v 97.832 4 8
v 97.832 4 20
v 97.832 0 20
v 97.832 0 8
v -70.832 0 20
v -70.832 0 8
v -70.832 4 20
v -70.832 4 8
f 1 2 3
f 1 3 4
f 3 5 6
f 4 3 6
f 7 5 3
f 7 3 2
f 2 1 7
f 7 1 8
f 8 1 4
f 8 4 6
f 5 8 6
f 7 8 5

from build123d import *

# Parameters (mm, degrees)
SKETCH1_W              = 155.663706144
SKETCH1_H              = 4
BOSS_EXTRUDE1_DEPTH    = 10
BOSS_EXTRUDE4_DEPTH    = 10
FILLET1_R              = 0.5
LPATTERN1_COUNT        = 21
LPATTERN1_PITCH        = 6.283185307
FILLET1_OF_LPATTERN1_R = 0.5
BOSS_EXTRUDE6_DEPTH    = 6
SKETCH11_W             = 16
SKETCH11_H             = 4
BOSS_EXTRUDE8_DEPTH    = 10
SKETCH12_W             = 16
SKETCH12_H             = 4
BOSS_EXTRUDE9_DEPTH    = 10
SKETCH15_W             = 175.663706144
SKETCH15_H             = 16
BOSS_EXTRUDE10_DEPTH   = 5
BOSS_EXTRUDE11_DEPTH   = 4
SKETCH17_W             = 20
SKETCH17_H             = 9
BOSS_EXTRUDE12_DEPTH   = 10
SKETCH18_W             = 20
SKETCH18_H             = 9
CUT_EXTRUDE2_DEPTH     = 17
SKETCH19_W             = 170
SKETCH19_H             = 15
CUT_EXTRUDE3_DEPTH     = 8
SKETCH21_W             = 168.663706144
SKETCH21_H             = 4.5
CUT_EXTRUDE5_DEPTH     = 13
SKETCH20_W             = 12
SKETCH20_H             = 5
CUT_EXTRUDE4_DEPTH     = 169.663706144


with BuildPart() as part:
    # Sketch1 → Boss-Extrude1 (new body)
    with BuildSketch(Plane.XY):
        with Locations((0, 2)):
            Rectangle(SKETCH1_W, SKETCH1_H)
    extrude(amount=BOSS_EXTRUDE1_DEPTH)

    # Sketch2 → Boss-Extrude4 (add)
    with BuildSketch(Plane.XY):
        Polygon((-65.312574984, 4), (-63.67470893, 8.5), (-61.988997214, 8.5), (-60.351131159, 4), align=None)
    boss_extrude4 = extrude(amount=BOSS_EXTRUDE4_DEPTH)

    # Fillet1
    fillet1_edges = [part.edges().sort_by_distance(p)[0] for p in [
        (-60.351131159, 4, 5),
        (-65.312574984, 4, 5),
    ]]
    fillet(fillet1_edges, radius=FILLET1_R)

    # LPattern1: Boss-Extrude4 ×21
    with Locations(*[(i * LPATTERN1_PITCH, 0, 0) for i in range(1, LPATTERN1_COUNT)]):
        add(boss_extrude4)

    # Fillet1 of LPattern1
    fillet1_of_lpattern1_edges = [part.edges().sort_by_distance(p)[0] for p in [
        (-54.067945852, 4, 5),
        (-59.029389677, 4, 5),
        (-47.784760545, 4, 5),
        (-52.74620437, 4, 5),
        (-41.501575238, 4, 5),
        (-46.463019063, 4, 5),
        (-35.218389931, 4, 5),
        (-40.179833756, 4, 5),
        (-28.935204623, 4, 5),
        (-33.896648448, 4, 5),
        (-22.652019316, 4, 5),
        (-27.613463141, 4, 5),
        (-16.368834009, 4, 5),
        (-21.330277834, 4, 5),
        (-10.085648702, 4, 5),
        (-15.047092527, 4, 5),
        (-3.802463395, 4, 5),
        (-8.76390722, 4, 5),
        (2.480721912, 4, 5),
        (-2.480721912, 4, 5),
        (8.76390722, 4, 5),
        (3.802463395, 4, 5),
        (15.047092527, 4, 5),
        (10.085648702, 4, 5),
        (21.330277834, 4, 5),
        (16.368834009, 4, 5),
        (27.613463141, 4, 5),
        (22.652019316, 4, 5),
        (33.896648448, 4, 5),
        (28.935204623, 4, 5),
        (40.179833756, 4, 5),
        (35.218389931, 4, 5),
        (46.463019063, 4, 5),
        (41.501575238, 4, 5),
        (52.74620437, 4, 5),
        (47.784760545, 4, 5),
        (59.029389677, 4, 5),
        (54.067945852, 4, 5),
        (65.312574984, 4, 5),
        (60.351131159, 4, 5),
    ]]
    fillet(fillet1_of_lpattern1_edges, radius=FILLET1_OF_LPATTERN1_R)

    # Sketch9 → Boss-Extrude6 (add)
    with BuildSketch(Plane.XY.offset(10)):
        with BuildLine():
            Line((-77.831853072, 4), (-77.831853072, 0))
            Line((-77.831853072, 0), (77.831853072, 0))
            Line((77.831853072, 0), (77.831853072, 4))
            Line((77.831853072, 4), (65.662678753, 4))
            ThreePointArc((65.662678753, 4), (65.375890535, 4.090423978), (65.192832443, 4.328989928))
            Line((65.192832443, 4.328989928), (63.67470893, 8.5))
            Line((63.67470893, 8.5), (61.988997214, 8.5))
            Line((61.988997214, 8.5), (60.470873701, 4.328989928))
            ThreePointArc((60.470873701, 4.328989928), (60.287815608, 4.090423978), (60.00102739, 4))
            Line((60.00102739, 4), (59.379493446, 4))
            ThreePointArc((59.379493446, 4), (59.092705228, 4.090423978), (58.909647136, 4.328989928))
            Line((58.909647136, 4.328989928), (57.391523623, 8.5))
            Line((57.391523623, 8.5), (55.705811906, 8.5))
            Line((55.705811906, 8.5), (54.187688393, 4.328989928))
            ThreePointArc((54.187688393, 4.328989928), (54.004630301, 4.090423978), (53.717842083, 4))
            Line((53.717842083, 4), (53.096308139, 4))
            ThreePointArc((53.096308139, 4), (52.809519921, 4.090423978), (52.626461829, 4.328989928))
            Line((52.626461829, 4.328989928), (51.108338316, 8.5))
            Line((51.108338316, 8.5), (49.422626599, 8.5))
            Line((49.422626599, 8.5), (47.904503086, 4.328989928))
            ThreePointArc((47.904503086, 4.328989928), (47.721444994, 4.090423978), (47.434656776, 4))
            Line((47.434656776, 4), (46.813122832, 4))
            ThreePointArc((46.813122832, 4), (46.526334614, 4.090423978), (46.343276521, 4.328989928))
            Line((46.343276521, 4.328989928), (44.825153009, 8.5))
            Line((44.825153009, 8.5), (43.139441292, 8.5))
            Line((43.139441292, 8.5), (41.621317779, 4.328989928))
            ThreePointArc((41.621317779, 4.328989928), (41.438259687, 4.090423978), (41.151471469, 4))
            Line((41.151471469, 4), (40.529937525, 4))
            ThreePointArc((40.529937525, 4), (40.243149306, 4.090423978), (40.060091214, 4.328989928))
            Line((40.060091214, 4.328989928), (38.541967701, 8.5))
            Line((38.541967701, 8.5), (36.856255985, 8.5))
            Line((36.856255985, 8.5), (35.338132472, 4.328989928))
            ThreePointArc((35.338132472, 4.328989928), (35.15507438, 4.090423978), (34.868286162, 4))
            Line((34.868286162, 4), (34.246752217, 4))
            ThreePointArc((34.246752217, 4), (33.959963999, 4.090423978), (33.776905907, 4.328989928))
            Line((33.776905907, 4.328989928), (32.258782394, 8.5))
            Line((32.258782394, 8.5), (30.573070678, 8.5))
            Line((30.573070678, 8.5), (29.054947165, 4.328989928))
            ThreePointArc((29.054947165, 4.328989928), (28.871889073, 4.090423978), (28.585100854, 4))
            Line((28.585100854, 4), (27.96356691, 4))
            ThreePointArc((27.96356691, 4), (27.676778692, 4.090423978), (27.4937206, 4.328989928))
            Line((27.4937206, 4.328989928), (25.975597087, 8.5))
            Line((25.975597087, 8.5), (24.28988537, 8.5))
            Line((24.28988537, 8.5), (22.771761858, 4.328989928))
            ThreePointArc((22.771761858, 4.328989928), (22.588703765, 4.090423978), (22.301915547, 4))
            Line((22.301915547, 4), (21.680381603, 4))
            ThreePointArc((21.680381603, 4), (21.393593385, 4.090423978), (21.210535293, 4.328989928))
            Line((21.210535293, 4.328989928), (19.69241178, 8.5))
            Line((19.69241178, 8.5), (18.006700063, 8.5))
            Line((18.006700063, 8.5), (16.48857655, 4.328989928))
            ThreePointArc((16.48857655, 4.328989928), (16.305518458, 4.090423978), (16.01873024, 4))
            Line((16.01873024, 4), (15.397196296, 4))
            ThreePointArc((15.397196296, 4), (15.110408078, 4.090423978), (14.927349986, 4.328989928))
            Line((14.927349986, 4.328989928), (13.409226473, 8.5))
            Line((13.409226473, 8.5), (11.723514756, 8.5))
            Line((11.723514756, 8.5), (10.205391243, 4.328989928))
            ThreePointArc((10.205391243, 4.328989928), (10.022333151, 4.090423978), (9.735544933, 4))
            Line((9.735544933, 4), (9.114010989, 4))
            ThreePointArc((9.114010989, 4), (8.827222771, 4.090423978), (8.644164678, 4.328989928))
            Line((8.644164678, 4.328989928), (7.126041165, 8.5))
            Line((7.126041165, 8.5), (5.440329449, 8.5))
            Line((5.440329449, 8.5), (3.922205936, 4.328989928))
            ThreePointArc((3.922205936, 4.328989928), (3.739147844, 4.090423978), (3.452359626, 4))
            Line((3.452359626, 4), (2.830825682, 4))
            ThreePointArc((2.830825682, 4), (2.544037463, 4.090423978), (2.360979371, 4.328989928))
            Line((2.360979371, 4.328989928), (0.842855858, 8.5))
            Line((0.842855858, 8.5), (-0.842855858, 8.5))
            Line((-0.842855858, 8.5), (-2.360979371, 4.328989928))
            ThreePointArc((-2.360979371, 4.328989928), (-2.544037463, 4.090423978), (-2.830825682, 4))
            Line((-2.830825682, 4), (-3.452359626, 4))
            ThreePointArc((-3.452359626, 4), (-3.739147844, 4.090423978), (-3.922205936, 4.328989928))
            Line((-3.922205936, 4.328989928), (-5.440329449, 8.5))
            Line((-5.440329449, 8.5), (-7.126041165, 8.5))
            Line((-7.126041165, 8.5), (-8.644164678, 4.328989928))
            ThreePointArc((-8.644164678, 4.328989928), (-8.827222771, 4.090423978), (-9.114010989, 4))
            Line((-9.114010989, 4), (-9.735544933, 4))
            ThreePointArc((-9.735544933, 4), (-10.022333151, 4.090423978), (-10.205391243, 4.328989928))
            Line((-10.205391243, 4.328989928), (-11.723514756, 8.5))
            Line((-11.723514756, 8.5), (-13.409226473, 8.5))
            Line((-13.409226473, 8.5), (-14.927349986, 4.328989928))
            ThreePointArc((-14.927349986, 4.328989928), (-15.110408078, 4.090423978), (-15.397196296, 4))
            Line((-15.397196296, 4), (-16.01873024, 4))
            ThreePointArc((-16.01873024, 4), (-16.305518458, 4.090423978), (-16.48857655, 4.328989928))
            Line((-16.48857655, 4.328989928), (-18.006700063, 8.5))
            Line((-18.006700063, 8.5), (-19.69241178, 8.5))
            Line((-19.69241178, 8.5), (-21.210535293, 4.328989928))
            ThreePointArc((-21.210535293, 4.328989928), (-21.393593385, 4.090423978), (-21.680381603, 4))
            Line((-21.680381603, 4), (-22.301915547, 4))
            ThreePointArc((-22.301915547, 4), (-22.588703765, 4.090423978), (-22.771761858, 4.328989928))
            Line((-22.771761858, 4.328989928), (-24.28988537, 8.5))
            Line((-24.28988537, 8.5), (-25.975597087, 8.5))
            Line((-25.975597087, 8.5), (-27.4937206, 4.328989928))
            ThreePointArc((-27.4937206, 4.328989928), (-27.676778692, 4.090423978), (-27.96356691, 4))
            Line((-27.96356691, 4), (-28.585100854, 4))
            ThreePointArc((-28.585100854, 4), (-28.871889073, 4.090423978), (-29.054947165, 4.328989928))
            Line((-29.054947165, 4.328989928), (-30.573070678, 8.5))
            Line((-30.573070678, 8.5), (-32.258782394, 8.5))
            Line((-32.258782394, 8.5), (-33.776905907, 4.328989928))
            ThreePointArc((-33.776905907, 4.328989928), (-33.959963999, 4.090423978), (-34.246752217, 4))
            Line((-34.246752217, 4), (-34.868286162, 4))
            ThreePointArc((-34.868286162, 4), (-35.15507438, 4.090423978), (-35.338132472, 4.328989928))
            Line((-35.338132472, 4.328989928), (-36.856255985, 8.5))
            Line((-36.856255985, 8.5), (-38.541967701, 8.5))
            Line((-38.541967701, 8.5), (-40.060091214, 4.328989928))
            ThreePointArc((-40.060091214, 4.328989928), (-40.243149306, 4.090423978), (-40.529937525, 4))
            Line((-40.529937525, 4), (-41.151471469, 4))
            ThreePointArc((-41.151471469, 4), (-41.438259687, 4.090423978), (-41.621317779, 4.328989928))
            Line((-41.621317779, 4.328989928), (-43.139441292, 8.5))
            Line((-43.139441292, 8.5), (-44.825153009, 8.5))
            Line((-44.825153009, 8.5), (-46.343276521, 4.328989928))
            ThreePointArc((-46.343276521, 4.328989928), (-46.526334614, 4.090423978), (-46.813122832, 4))
            Line((-46.813122832, 4), (-47.434656776, 4))
            ThreePointArc((-47.434656776, 4), (-47.721444994, 4.090423978), (-47.904503086, 4.328989928))
            Line((-47.904503086, 4.328989928), (-49.422626599, 8.5))
            Line((-49.422626599, 8.5), (-51.108338316, 8.5))
            Line((-51.108338316, 8.5), (-52.626461829, 4.328989928))
            ThreePointArc((-52.626461829, 4.328989928), (-52.809519921, 4.090423978), (-53.096308139, 4))
            Line((-53.096308139, 4), (-53.717842083, 4))
            ThreePointArc((-53.717842083, 4), (-54.004630301, 4.090423978), (-54.187688393, 4.328989928))
            Line((-54.187688393, 4.328989928), (-55.705811906, 8.5))
            Line((-55.705811906, 8.5), (-57.391523623, 8.5))
            Line((-57.391523623, 8.5), (-58.909647136, 4.328989928))
            ThreePointArc((-58.909647136, 4.328989928), (-59.092705228, 4.090423978), (-59.379493446, 4))
            Line((-59.379493446, 4), (-60.00102739, 4))
            ThreePointArc((-60.00102739, 4), (-60.287815608, 4.090423978), (-60.470873701, 4.328989928))
            Line((-60.470873701, 4.328989928), (-61.988997214, 8.5))
            Line((-61.988997214, 8.5), (-63.67470893, 8.5))
            Line((-63.67470893, 8.5), (-65.192832443, 4.328989928))
            ThreePointArc((-65.192832443, 4.328989928), (-65.375890535, 4.090423978), (-65.662678753, 4))
            Line((-65.662678753, 4), (-77.831853072, 4))
        make_face()
    extrude(amount=BOSS_EXTRUDE6_DEPTH)

    # Sketch11 → Boss-Extrude8 (add)
    with BuildSketch(Plane.ZY.offset(77.831853072)):
        with Locations((8, 2)):
            Rectangle(SKETCH11_W, SKETCH11_H)
    extrude(amount=BOSS_EXTRUDE8_DEPTH)

    # Sketch12 → Boss-Extrude9 (add)
    with BuildSketch(Plane(origin=(77.831853072, 0, 0), x_dir=(0, 0, -1), z_dir=(1, 0, 0))):
        with Locations((-8, 2)):
            Rectangle(SKETCH12_W, SKETCH12_H)
    extrude(amount=BOSS_EXTRUDE9_DEPTH)

    # Sketch15 → Boss-Extrude10 (add)
    with BuildSketch(Plane.XZ):
        with Locations((0, 8)):
            Rectangle(SKETCH15_W, SKETCH15_H)
    extrude(amount=BOSS_EXTRUDE10_DEPTH)

    # Sketch16 → Boss-Extrude11 (add)
    with BuildSketch(Plane.XY.offset(16)):
        with BuildLine():
            Line((-61.988997214, 8.5), (-63.67470893, 8.5))
            Line((-63.67470893, 8.5), (-65.192832443, 4.328989928))
            ThreePointArc((-65.192832443, 4.328989928), (-65.375890535, 4.090423978), (-65.662678753, 4))
            Line((-65.662678753, 4), (-87.831853072, 4))
            Line((-87.831853072, 4), (-87.831853072, -5))
            Line((-87.831853072, -5), (87.831853072, -5))
            Line((87.831853072, -5), (87.831853072, 4))
            Line((87.831853072, 4), (65.662678753, 4))
            ThreePointArc((65.662678753, 4), (65.375890535, 4.090423978), (65.192832443, 4.328989928))
            Line((65.192832443, 4.328989928), (63.67470893, 8.5))
            Line((63.67470893, 8.5), (61.988997214, 8.5))
            Line((61.988997214, 8.5), (60.470873701, 4.328989928))
            ThreePointArc((60.470873701, 4.328989928), (60.287815608, 4.090423978), (60.00102739, 4))
            Line((60.00102739, 4), (59.379493446, 4))
            ThreePointArc((59.379493446, 4), (59.092705228, 4.090423978), (58.909647136, 4.328989928))
            Line((58.909647136, 4.328989928), (57.391523623, 8.5))
            Line((57.391523623, 8.5), (55.705811906, 8.5))
            Line((55.705811906, 8.5), (54.187688393, 4.328989928))
            ThreePointArc((54.187688393, 4.328989928), (54.004630301, 4.090423978), (53.717842083, 4))
            Line((53.717842083, 4), (53.096308139, 4))
            ThreePointArc((53.096308139, 4), (52.809519921, 4.090423978), (52.626461829, 4.328989928))
            Line((52.626461829, 4.328989928), (51.108338316, 8.5))
            Line((51.108338316, 8.5), (49.422626599, 8.5))
            Line((49.422626599, 8.5), (47.904503086, 4.328989928))
            ThreePointArc((47.904503086, 4.328989928), (47.721444994, 4.090423978), (47.434656776, 4))
            Line((47.434656776, 4), (46.813122832, 4))
            ThreePointArc((46.813122832, 4), (46.526334614, 4.090423978), (46.343276521, 4.328989928))
            Line((46.343276521, 4.328989928), (44.825153009, 8.5))
            Line((44.825153009, 8.5), (43.139441292, 8.5))
            Line((43.139441292, 8.5), (41.621317779, 4.328989928))
            ThreePointArc((41.621317779, 4.328989928), (41.438259687, 4.090423978), (41.151471469, 4))
            Line((41.151471469, 4), (40.529937525, 4))
            ThreePointArc((40.529937525, 4), (40.243149306, 4.090423978), (40.060091214, 4.328989928))
            Line((40.060091214, 4.328989928), (38.541967701, 8.5))
            Line((38.541967701, 8.5), (36.856255985, 8.5))
            Line((36.856255985, 8.5), (35.338132472, 4.328989928))
            ThreePointArc((35.338132472, 4.328989928), (35.15507438, 4.090423978), (34.868286162, 4))
            Line((34.868286162, 4), (34.246752217, 4))
            ThreePointArc((34.246752217, 4), (33.959963999, 4.090423978), (33.776905907, 4.328989928))
            Line((33.776905907, 4.328989928), (32.258782394, 8.5))
            Line((32.258782394, 8.5), (30.573070678, 8.5))
            Line((30.573070678, 8.5), (29.054947165, 4.328989928))
            ThreePointArc((29.054947165, 4.328989928), (28.871889073, 4.090423978), (28.585100854, 4))
            Line((28.585100854, 4), (27.96356691, 4))
            ThreePointArc((27.96356691, 4), (27.676778692, 4.090423978), (27.4937206, 4.328989928))
            Line((27.4937206, 4.328989928), (25.975597087, 8.5))
            Line((25.975597087, 8.5), (24.28988537, 8.5))
            Line((24.28988537, 8.5), (22.771761858, 4.328989928))
            ThreePointArc((22.771761858, 4.328989928), (22.588703765, 4.090423978), (22.301915547, 4))
            Line((22.301915547, 4), (21.680381603, 4))
            ThreePointArc((21.680381603, 4), (21.393593385, 4.090423978), (21.210535293, 4.328989928))
            Line((21.210535293, 4.328989928), (19.69241178, 8.5))
            Line((19.69241178, 8.5), (18.006700063, 8.5))
            Line((18.006700063, 8.5), (16.48857655, 4.328989928))
            ThreePointArc((16.48857655, 4.328989928), (16.305518458, 4.090423978), (16.01873024, 4))
            Line((16.01873024, 4), (15.397196296, 4))
            ThreePointArc((15.397196296, 4), (15.110408078, 4.090423978), (14.927349986, 4.328989928))
            Line((14.927349986, 4.328989928), (13.409226473, 8.5))
            Line((13.409226473, 8.5), (11.723514756, 8.5))
            Line((11.723514756, 8.5), (10.205391243, 4.328989928))
            ThreePointArc((10.205391243, 4.328989928), (10.022333151, 4.090423978), (9.735544933, 4))
            Line((9.735544933, 4), (9.114010989, 4))
            ThreePointArc((9.114010989, 4), (8.827222771, 4.090423978), (8.644164678, 4.328989928))
            Line((8.644164678, 4.328989928), (7.126041165, 8.5))
            Line((7.126041165, 8.5), (5.440329449, 8.5))
            Line((5.440329449, 8.5), (3.922205936, 4.328989928))
            ThreePointArc((3.922205936, 4.328989928), (3.739147844, 4.090423978), (3.452359626, 4))
            Line((3.452359626, 4), (2.830825682, 4))
            ThreePointArc((2.830825682, 4), (2.544037463, 4.090423978), (2.360979371, 4.328989928))
            Line((2.360979371, 4.328989928), (0.842855858, 8.5))
            Line((0.842855858, 8.5), (-0.842855858, 8.5))
            Line((-0.842855858, 8.5), (-2.360979371, 4.328989928))
            ThreePointArc((-2.360979371, 4.328989928), (-2.544037463, 4.090423978), (-2.830825682, 4))
            Line((-2.830825682, 4), (-3.452359626, 4))
            ThreePointArc((-3.452359626, 4), (-3.739147844, 4.090423978), (-3.922205936, 4.328989928))
            Line((-3.922205936, 4.328989928), (-5.440329449, 8.5))
            Line((-5.440329449, 8.5), (-7.126041165, 8.5))
            Line((-7.126041165, 8.5), (-8.644164678, 4.328989928))
            ThreePointArc((-8.644164678, 4.328989928), (-8.827222771, 4.090423978), (-9.114010989, 4))
            Line((-9.114010989, 4), (-9.735544933, 4))
            ThreePointArc((-9.735544933, 4), (-10.022333151, 4.090423978), (-10.205391243, 4.328989928))
            Line((-10.205391243, 4.328989928), (-11.723514756, 8.5))
            Line((-11.723514756, 8.5), (-13.409226473, 8.5))
            Line((-13.409226473, 8.5), (-14.927349986, 4.328989928))
            ThreePointArc((-14.927349986, 4.328989928), (-15.110408078, 4.090423978), (-15.397196296, 4))
            Line((-15.397196296, 4), (-16.01873024, 4))
            ThreePointArc((-16.01873024, 4), (-16.305518458, 4.090423978), (-16.48857655, 4.328989928))
            Line((-16.48857655, 4.328989928), (-18.006700063, 8.5))
            Line((-18.006700063, 8.5), (-19.69241178, 8.5))
            Line((-19.69241178, 8.5), (-21.210535293, 4.328989928))
            ThreePointArc((-21.210535293, 4.328989928), (-21.393593385, 4.090423978), (-21.680381603, 4))
            Line((-21.680381603, 4), (-22.301915547, 4))
            ThreePointArc((-22.301915547, 4), (-22.588703765, 4.090423978), (-22.771761858, 4.328989928))
            Line((-22.771761858, 4.328989928), (-24.28988537, 8.5))
            Line((-24.28988537, 8.5), (-25.975597087, 8.5))
            Line((-25.975597087, 8.5), (-27.4937206, 4.328989928))
            ThreePointArc((-27.4937206, 4.328989928), (-27.676778692, 4.090423978), (-27.96356691, 4))
            Line((-27.96356691, 4), (-28.585100854, 4))
            ThreePointArc((-28.585100854, 4), (-28.871889073, 4.090423978), (-29.054947165, 4.328989928))
            Line((-29.054947165, 4.328989928), (-30.573070678, 8.5))
            Line((-30.573070678, 8.5), (-32.258782394, 8.5))
            Line((-32.258782394, 8.5), (-33.776905907, 4.328989928))
            ThreePointArc((-33.776905907, 4.328989928), (-33.959963999, 4.090423978), (-34.246752217, 4))
            Line((-34.246752217, 4), (-34.868286162, 4))
            ThreePointArc((-34.868286162, 4), (-35.15507438, 4.090423978), (-35.338132472, 4.328989928))
            Line((-35.338132472, 4.328989928), (-36.856255985, 8.5))
            Line((-36.856255985, 8.5), (-38.541967701, 8.5))
            Line((-38.541967701, 8.5), (-40.060091214, 4.328989928))
            ThreePointArc((-40.060091214, 4.328989928), (-40.243149306, 4.090423978), (-40.529937525, 4))
            Line((-40.529937525, 4), (-41.151471469, 4))
            ThreePointArc((-41.151471469, 4), (-41.438259687, 4.090423978), (-41.621317779, 4.328989928))
            Line((-41.621317779, 4.328989928), (-43.139441292, 8.5))
            Line((-43.139441292, 8.5), (-44.825153009, 8.5))
            Line((-44.825153009, 8.5), (-46.343276521, 4.328989928))
            ThreePointArc((-46.343276521, 4.328989928), (-46.526334614, 4.090423978), (-46.813122832, 4))
            Line((-46.813122832, 4), (-47.434656776, 4))
            ThreePointArc((-47.434656776, 4), (-47.721444994, 4.090423978), (-47.904503086, 4.328989928))
            Line((-47.904503086, 4.328989928), (-49.422626599, 8.5))
            Line((-49.422626599, 8.5), (-51.108338316, 8.5))
            Line((-51.108338316, 8.5), (-52.626461829, 4.328989928))
            ThreePointArc((-52.626461829, 4.328989928), (-52.809519921, 4.090423978), (-53.096308139, 4))
            Line((-53.096308139, 4), (-53.717842083, 4))
            ThreePointArc((-53.717842083, 4), (-54.004630301, 4.090423978), (-54.187688393, 4.328989928))
            Line((-54.187688393, 4.328989928), (-55.705811906, 8.5))
            Line((-55.705811906, 8.5), (-57.391523623, 8.5))
            Line((-57.391523623, 8.5), (-58.909647136, 4.328989928))
            ThreePointArc((-58.909647136, 4.328989928), (-59.092705228, 4.090423978), (-59.379493446, 4))
            Line((-59.379493446, 4), (-60.00102739, 4))
            ThreePointArc((-60.00102739, 4), (-60.287815608, 4.090423978), (-60.470873701, 4.328989928))
            Line((-60.470873701, 4.328989928), (-61.988997214, 8.5))
        make_face()
    extrude(amount=BOSS_EXTRUDE11_DEPTH)

    # Sketch17 → Boss-Extrude12 (add)
    with BuildSketch(Plane(origin=(87.831853072, 0, 0), x_dir=(0, 0, -1), z_dir=(1, 0, 0))):
        with Locations((-10, -0.5)):
            Rectangle(SKETCH17_W, SKETCH17_H)
    extrude(amount=BOSS_EXTRUDE12_DEPTH)

    # Sketch18 → Cut-Extrude2 (cut)
    with BuildSketch(Plane.ZY.offset(87.831853072)):
        with Locations((10, -0.5)):
            Rectangle(SKETCH18_W, SKETCH18_H)
    extrude(amount=-CUT_EXTRUDE2_DEPTH, mode=Mode.SUBTRACT)

    # Sketch19 → Cut-Extrude3 (cut)
    with BuildSketch(Plane(origin=(0, 0, 0), x_dir=(-1, 0, 0), z_dir=(0, 0, -1))):
        with Locations((-12.831853072, 2.5)):
            Rectangle(SKETCH19_W, SKETCH19_H)
    extrude(amount=-CUT_EXTRUDE3_DEPTH, mode=Mode.SUBTRACT)

    # Sketch21 → Cut-Extrude5 (cut, through all)
    with BuildSketch(Plane(origin=(0, 0, 8), x_dir=(-1, 0, 0), z_dir=(0, 0, -1))):
        with Locations((-13.5, 6.25)):
            Rectangle(SKETCH21_W, SKETCH21_H)
    extrude(amount=-CUT_EXTRUDE5_DEPTH, mode=Mode.SUBTRACT)

    # Sketch20 → Cut-Extrude4 (cut, through all)
    with BuildSketch(Plane(origin=(97.831853072, 0, 0), x_dir=(0, 0, -1), z_dir=(1, 0, 0))):
        with Locations((-14, -2.5)):
            Rectangle(SKETCH20_W, SKETCH20_H)
    extrude(amount=-CUT_EXTRUDE4_DEPTH, mode=Mode.SUBTRACT)


solid = part.part
